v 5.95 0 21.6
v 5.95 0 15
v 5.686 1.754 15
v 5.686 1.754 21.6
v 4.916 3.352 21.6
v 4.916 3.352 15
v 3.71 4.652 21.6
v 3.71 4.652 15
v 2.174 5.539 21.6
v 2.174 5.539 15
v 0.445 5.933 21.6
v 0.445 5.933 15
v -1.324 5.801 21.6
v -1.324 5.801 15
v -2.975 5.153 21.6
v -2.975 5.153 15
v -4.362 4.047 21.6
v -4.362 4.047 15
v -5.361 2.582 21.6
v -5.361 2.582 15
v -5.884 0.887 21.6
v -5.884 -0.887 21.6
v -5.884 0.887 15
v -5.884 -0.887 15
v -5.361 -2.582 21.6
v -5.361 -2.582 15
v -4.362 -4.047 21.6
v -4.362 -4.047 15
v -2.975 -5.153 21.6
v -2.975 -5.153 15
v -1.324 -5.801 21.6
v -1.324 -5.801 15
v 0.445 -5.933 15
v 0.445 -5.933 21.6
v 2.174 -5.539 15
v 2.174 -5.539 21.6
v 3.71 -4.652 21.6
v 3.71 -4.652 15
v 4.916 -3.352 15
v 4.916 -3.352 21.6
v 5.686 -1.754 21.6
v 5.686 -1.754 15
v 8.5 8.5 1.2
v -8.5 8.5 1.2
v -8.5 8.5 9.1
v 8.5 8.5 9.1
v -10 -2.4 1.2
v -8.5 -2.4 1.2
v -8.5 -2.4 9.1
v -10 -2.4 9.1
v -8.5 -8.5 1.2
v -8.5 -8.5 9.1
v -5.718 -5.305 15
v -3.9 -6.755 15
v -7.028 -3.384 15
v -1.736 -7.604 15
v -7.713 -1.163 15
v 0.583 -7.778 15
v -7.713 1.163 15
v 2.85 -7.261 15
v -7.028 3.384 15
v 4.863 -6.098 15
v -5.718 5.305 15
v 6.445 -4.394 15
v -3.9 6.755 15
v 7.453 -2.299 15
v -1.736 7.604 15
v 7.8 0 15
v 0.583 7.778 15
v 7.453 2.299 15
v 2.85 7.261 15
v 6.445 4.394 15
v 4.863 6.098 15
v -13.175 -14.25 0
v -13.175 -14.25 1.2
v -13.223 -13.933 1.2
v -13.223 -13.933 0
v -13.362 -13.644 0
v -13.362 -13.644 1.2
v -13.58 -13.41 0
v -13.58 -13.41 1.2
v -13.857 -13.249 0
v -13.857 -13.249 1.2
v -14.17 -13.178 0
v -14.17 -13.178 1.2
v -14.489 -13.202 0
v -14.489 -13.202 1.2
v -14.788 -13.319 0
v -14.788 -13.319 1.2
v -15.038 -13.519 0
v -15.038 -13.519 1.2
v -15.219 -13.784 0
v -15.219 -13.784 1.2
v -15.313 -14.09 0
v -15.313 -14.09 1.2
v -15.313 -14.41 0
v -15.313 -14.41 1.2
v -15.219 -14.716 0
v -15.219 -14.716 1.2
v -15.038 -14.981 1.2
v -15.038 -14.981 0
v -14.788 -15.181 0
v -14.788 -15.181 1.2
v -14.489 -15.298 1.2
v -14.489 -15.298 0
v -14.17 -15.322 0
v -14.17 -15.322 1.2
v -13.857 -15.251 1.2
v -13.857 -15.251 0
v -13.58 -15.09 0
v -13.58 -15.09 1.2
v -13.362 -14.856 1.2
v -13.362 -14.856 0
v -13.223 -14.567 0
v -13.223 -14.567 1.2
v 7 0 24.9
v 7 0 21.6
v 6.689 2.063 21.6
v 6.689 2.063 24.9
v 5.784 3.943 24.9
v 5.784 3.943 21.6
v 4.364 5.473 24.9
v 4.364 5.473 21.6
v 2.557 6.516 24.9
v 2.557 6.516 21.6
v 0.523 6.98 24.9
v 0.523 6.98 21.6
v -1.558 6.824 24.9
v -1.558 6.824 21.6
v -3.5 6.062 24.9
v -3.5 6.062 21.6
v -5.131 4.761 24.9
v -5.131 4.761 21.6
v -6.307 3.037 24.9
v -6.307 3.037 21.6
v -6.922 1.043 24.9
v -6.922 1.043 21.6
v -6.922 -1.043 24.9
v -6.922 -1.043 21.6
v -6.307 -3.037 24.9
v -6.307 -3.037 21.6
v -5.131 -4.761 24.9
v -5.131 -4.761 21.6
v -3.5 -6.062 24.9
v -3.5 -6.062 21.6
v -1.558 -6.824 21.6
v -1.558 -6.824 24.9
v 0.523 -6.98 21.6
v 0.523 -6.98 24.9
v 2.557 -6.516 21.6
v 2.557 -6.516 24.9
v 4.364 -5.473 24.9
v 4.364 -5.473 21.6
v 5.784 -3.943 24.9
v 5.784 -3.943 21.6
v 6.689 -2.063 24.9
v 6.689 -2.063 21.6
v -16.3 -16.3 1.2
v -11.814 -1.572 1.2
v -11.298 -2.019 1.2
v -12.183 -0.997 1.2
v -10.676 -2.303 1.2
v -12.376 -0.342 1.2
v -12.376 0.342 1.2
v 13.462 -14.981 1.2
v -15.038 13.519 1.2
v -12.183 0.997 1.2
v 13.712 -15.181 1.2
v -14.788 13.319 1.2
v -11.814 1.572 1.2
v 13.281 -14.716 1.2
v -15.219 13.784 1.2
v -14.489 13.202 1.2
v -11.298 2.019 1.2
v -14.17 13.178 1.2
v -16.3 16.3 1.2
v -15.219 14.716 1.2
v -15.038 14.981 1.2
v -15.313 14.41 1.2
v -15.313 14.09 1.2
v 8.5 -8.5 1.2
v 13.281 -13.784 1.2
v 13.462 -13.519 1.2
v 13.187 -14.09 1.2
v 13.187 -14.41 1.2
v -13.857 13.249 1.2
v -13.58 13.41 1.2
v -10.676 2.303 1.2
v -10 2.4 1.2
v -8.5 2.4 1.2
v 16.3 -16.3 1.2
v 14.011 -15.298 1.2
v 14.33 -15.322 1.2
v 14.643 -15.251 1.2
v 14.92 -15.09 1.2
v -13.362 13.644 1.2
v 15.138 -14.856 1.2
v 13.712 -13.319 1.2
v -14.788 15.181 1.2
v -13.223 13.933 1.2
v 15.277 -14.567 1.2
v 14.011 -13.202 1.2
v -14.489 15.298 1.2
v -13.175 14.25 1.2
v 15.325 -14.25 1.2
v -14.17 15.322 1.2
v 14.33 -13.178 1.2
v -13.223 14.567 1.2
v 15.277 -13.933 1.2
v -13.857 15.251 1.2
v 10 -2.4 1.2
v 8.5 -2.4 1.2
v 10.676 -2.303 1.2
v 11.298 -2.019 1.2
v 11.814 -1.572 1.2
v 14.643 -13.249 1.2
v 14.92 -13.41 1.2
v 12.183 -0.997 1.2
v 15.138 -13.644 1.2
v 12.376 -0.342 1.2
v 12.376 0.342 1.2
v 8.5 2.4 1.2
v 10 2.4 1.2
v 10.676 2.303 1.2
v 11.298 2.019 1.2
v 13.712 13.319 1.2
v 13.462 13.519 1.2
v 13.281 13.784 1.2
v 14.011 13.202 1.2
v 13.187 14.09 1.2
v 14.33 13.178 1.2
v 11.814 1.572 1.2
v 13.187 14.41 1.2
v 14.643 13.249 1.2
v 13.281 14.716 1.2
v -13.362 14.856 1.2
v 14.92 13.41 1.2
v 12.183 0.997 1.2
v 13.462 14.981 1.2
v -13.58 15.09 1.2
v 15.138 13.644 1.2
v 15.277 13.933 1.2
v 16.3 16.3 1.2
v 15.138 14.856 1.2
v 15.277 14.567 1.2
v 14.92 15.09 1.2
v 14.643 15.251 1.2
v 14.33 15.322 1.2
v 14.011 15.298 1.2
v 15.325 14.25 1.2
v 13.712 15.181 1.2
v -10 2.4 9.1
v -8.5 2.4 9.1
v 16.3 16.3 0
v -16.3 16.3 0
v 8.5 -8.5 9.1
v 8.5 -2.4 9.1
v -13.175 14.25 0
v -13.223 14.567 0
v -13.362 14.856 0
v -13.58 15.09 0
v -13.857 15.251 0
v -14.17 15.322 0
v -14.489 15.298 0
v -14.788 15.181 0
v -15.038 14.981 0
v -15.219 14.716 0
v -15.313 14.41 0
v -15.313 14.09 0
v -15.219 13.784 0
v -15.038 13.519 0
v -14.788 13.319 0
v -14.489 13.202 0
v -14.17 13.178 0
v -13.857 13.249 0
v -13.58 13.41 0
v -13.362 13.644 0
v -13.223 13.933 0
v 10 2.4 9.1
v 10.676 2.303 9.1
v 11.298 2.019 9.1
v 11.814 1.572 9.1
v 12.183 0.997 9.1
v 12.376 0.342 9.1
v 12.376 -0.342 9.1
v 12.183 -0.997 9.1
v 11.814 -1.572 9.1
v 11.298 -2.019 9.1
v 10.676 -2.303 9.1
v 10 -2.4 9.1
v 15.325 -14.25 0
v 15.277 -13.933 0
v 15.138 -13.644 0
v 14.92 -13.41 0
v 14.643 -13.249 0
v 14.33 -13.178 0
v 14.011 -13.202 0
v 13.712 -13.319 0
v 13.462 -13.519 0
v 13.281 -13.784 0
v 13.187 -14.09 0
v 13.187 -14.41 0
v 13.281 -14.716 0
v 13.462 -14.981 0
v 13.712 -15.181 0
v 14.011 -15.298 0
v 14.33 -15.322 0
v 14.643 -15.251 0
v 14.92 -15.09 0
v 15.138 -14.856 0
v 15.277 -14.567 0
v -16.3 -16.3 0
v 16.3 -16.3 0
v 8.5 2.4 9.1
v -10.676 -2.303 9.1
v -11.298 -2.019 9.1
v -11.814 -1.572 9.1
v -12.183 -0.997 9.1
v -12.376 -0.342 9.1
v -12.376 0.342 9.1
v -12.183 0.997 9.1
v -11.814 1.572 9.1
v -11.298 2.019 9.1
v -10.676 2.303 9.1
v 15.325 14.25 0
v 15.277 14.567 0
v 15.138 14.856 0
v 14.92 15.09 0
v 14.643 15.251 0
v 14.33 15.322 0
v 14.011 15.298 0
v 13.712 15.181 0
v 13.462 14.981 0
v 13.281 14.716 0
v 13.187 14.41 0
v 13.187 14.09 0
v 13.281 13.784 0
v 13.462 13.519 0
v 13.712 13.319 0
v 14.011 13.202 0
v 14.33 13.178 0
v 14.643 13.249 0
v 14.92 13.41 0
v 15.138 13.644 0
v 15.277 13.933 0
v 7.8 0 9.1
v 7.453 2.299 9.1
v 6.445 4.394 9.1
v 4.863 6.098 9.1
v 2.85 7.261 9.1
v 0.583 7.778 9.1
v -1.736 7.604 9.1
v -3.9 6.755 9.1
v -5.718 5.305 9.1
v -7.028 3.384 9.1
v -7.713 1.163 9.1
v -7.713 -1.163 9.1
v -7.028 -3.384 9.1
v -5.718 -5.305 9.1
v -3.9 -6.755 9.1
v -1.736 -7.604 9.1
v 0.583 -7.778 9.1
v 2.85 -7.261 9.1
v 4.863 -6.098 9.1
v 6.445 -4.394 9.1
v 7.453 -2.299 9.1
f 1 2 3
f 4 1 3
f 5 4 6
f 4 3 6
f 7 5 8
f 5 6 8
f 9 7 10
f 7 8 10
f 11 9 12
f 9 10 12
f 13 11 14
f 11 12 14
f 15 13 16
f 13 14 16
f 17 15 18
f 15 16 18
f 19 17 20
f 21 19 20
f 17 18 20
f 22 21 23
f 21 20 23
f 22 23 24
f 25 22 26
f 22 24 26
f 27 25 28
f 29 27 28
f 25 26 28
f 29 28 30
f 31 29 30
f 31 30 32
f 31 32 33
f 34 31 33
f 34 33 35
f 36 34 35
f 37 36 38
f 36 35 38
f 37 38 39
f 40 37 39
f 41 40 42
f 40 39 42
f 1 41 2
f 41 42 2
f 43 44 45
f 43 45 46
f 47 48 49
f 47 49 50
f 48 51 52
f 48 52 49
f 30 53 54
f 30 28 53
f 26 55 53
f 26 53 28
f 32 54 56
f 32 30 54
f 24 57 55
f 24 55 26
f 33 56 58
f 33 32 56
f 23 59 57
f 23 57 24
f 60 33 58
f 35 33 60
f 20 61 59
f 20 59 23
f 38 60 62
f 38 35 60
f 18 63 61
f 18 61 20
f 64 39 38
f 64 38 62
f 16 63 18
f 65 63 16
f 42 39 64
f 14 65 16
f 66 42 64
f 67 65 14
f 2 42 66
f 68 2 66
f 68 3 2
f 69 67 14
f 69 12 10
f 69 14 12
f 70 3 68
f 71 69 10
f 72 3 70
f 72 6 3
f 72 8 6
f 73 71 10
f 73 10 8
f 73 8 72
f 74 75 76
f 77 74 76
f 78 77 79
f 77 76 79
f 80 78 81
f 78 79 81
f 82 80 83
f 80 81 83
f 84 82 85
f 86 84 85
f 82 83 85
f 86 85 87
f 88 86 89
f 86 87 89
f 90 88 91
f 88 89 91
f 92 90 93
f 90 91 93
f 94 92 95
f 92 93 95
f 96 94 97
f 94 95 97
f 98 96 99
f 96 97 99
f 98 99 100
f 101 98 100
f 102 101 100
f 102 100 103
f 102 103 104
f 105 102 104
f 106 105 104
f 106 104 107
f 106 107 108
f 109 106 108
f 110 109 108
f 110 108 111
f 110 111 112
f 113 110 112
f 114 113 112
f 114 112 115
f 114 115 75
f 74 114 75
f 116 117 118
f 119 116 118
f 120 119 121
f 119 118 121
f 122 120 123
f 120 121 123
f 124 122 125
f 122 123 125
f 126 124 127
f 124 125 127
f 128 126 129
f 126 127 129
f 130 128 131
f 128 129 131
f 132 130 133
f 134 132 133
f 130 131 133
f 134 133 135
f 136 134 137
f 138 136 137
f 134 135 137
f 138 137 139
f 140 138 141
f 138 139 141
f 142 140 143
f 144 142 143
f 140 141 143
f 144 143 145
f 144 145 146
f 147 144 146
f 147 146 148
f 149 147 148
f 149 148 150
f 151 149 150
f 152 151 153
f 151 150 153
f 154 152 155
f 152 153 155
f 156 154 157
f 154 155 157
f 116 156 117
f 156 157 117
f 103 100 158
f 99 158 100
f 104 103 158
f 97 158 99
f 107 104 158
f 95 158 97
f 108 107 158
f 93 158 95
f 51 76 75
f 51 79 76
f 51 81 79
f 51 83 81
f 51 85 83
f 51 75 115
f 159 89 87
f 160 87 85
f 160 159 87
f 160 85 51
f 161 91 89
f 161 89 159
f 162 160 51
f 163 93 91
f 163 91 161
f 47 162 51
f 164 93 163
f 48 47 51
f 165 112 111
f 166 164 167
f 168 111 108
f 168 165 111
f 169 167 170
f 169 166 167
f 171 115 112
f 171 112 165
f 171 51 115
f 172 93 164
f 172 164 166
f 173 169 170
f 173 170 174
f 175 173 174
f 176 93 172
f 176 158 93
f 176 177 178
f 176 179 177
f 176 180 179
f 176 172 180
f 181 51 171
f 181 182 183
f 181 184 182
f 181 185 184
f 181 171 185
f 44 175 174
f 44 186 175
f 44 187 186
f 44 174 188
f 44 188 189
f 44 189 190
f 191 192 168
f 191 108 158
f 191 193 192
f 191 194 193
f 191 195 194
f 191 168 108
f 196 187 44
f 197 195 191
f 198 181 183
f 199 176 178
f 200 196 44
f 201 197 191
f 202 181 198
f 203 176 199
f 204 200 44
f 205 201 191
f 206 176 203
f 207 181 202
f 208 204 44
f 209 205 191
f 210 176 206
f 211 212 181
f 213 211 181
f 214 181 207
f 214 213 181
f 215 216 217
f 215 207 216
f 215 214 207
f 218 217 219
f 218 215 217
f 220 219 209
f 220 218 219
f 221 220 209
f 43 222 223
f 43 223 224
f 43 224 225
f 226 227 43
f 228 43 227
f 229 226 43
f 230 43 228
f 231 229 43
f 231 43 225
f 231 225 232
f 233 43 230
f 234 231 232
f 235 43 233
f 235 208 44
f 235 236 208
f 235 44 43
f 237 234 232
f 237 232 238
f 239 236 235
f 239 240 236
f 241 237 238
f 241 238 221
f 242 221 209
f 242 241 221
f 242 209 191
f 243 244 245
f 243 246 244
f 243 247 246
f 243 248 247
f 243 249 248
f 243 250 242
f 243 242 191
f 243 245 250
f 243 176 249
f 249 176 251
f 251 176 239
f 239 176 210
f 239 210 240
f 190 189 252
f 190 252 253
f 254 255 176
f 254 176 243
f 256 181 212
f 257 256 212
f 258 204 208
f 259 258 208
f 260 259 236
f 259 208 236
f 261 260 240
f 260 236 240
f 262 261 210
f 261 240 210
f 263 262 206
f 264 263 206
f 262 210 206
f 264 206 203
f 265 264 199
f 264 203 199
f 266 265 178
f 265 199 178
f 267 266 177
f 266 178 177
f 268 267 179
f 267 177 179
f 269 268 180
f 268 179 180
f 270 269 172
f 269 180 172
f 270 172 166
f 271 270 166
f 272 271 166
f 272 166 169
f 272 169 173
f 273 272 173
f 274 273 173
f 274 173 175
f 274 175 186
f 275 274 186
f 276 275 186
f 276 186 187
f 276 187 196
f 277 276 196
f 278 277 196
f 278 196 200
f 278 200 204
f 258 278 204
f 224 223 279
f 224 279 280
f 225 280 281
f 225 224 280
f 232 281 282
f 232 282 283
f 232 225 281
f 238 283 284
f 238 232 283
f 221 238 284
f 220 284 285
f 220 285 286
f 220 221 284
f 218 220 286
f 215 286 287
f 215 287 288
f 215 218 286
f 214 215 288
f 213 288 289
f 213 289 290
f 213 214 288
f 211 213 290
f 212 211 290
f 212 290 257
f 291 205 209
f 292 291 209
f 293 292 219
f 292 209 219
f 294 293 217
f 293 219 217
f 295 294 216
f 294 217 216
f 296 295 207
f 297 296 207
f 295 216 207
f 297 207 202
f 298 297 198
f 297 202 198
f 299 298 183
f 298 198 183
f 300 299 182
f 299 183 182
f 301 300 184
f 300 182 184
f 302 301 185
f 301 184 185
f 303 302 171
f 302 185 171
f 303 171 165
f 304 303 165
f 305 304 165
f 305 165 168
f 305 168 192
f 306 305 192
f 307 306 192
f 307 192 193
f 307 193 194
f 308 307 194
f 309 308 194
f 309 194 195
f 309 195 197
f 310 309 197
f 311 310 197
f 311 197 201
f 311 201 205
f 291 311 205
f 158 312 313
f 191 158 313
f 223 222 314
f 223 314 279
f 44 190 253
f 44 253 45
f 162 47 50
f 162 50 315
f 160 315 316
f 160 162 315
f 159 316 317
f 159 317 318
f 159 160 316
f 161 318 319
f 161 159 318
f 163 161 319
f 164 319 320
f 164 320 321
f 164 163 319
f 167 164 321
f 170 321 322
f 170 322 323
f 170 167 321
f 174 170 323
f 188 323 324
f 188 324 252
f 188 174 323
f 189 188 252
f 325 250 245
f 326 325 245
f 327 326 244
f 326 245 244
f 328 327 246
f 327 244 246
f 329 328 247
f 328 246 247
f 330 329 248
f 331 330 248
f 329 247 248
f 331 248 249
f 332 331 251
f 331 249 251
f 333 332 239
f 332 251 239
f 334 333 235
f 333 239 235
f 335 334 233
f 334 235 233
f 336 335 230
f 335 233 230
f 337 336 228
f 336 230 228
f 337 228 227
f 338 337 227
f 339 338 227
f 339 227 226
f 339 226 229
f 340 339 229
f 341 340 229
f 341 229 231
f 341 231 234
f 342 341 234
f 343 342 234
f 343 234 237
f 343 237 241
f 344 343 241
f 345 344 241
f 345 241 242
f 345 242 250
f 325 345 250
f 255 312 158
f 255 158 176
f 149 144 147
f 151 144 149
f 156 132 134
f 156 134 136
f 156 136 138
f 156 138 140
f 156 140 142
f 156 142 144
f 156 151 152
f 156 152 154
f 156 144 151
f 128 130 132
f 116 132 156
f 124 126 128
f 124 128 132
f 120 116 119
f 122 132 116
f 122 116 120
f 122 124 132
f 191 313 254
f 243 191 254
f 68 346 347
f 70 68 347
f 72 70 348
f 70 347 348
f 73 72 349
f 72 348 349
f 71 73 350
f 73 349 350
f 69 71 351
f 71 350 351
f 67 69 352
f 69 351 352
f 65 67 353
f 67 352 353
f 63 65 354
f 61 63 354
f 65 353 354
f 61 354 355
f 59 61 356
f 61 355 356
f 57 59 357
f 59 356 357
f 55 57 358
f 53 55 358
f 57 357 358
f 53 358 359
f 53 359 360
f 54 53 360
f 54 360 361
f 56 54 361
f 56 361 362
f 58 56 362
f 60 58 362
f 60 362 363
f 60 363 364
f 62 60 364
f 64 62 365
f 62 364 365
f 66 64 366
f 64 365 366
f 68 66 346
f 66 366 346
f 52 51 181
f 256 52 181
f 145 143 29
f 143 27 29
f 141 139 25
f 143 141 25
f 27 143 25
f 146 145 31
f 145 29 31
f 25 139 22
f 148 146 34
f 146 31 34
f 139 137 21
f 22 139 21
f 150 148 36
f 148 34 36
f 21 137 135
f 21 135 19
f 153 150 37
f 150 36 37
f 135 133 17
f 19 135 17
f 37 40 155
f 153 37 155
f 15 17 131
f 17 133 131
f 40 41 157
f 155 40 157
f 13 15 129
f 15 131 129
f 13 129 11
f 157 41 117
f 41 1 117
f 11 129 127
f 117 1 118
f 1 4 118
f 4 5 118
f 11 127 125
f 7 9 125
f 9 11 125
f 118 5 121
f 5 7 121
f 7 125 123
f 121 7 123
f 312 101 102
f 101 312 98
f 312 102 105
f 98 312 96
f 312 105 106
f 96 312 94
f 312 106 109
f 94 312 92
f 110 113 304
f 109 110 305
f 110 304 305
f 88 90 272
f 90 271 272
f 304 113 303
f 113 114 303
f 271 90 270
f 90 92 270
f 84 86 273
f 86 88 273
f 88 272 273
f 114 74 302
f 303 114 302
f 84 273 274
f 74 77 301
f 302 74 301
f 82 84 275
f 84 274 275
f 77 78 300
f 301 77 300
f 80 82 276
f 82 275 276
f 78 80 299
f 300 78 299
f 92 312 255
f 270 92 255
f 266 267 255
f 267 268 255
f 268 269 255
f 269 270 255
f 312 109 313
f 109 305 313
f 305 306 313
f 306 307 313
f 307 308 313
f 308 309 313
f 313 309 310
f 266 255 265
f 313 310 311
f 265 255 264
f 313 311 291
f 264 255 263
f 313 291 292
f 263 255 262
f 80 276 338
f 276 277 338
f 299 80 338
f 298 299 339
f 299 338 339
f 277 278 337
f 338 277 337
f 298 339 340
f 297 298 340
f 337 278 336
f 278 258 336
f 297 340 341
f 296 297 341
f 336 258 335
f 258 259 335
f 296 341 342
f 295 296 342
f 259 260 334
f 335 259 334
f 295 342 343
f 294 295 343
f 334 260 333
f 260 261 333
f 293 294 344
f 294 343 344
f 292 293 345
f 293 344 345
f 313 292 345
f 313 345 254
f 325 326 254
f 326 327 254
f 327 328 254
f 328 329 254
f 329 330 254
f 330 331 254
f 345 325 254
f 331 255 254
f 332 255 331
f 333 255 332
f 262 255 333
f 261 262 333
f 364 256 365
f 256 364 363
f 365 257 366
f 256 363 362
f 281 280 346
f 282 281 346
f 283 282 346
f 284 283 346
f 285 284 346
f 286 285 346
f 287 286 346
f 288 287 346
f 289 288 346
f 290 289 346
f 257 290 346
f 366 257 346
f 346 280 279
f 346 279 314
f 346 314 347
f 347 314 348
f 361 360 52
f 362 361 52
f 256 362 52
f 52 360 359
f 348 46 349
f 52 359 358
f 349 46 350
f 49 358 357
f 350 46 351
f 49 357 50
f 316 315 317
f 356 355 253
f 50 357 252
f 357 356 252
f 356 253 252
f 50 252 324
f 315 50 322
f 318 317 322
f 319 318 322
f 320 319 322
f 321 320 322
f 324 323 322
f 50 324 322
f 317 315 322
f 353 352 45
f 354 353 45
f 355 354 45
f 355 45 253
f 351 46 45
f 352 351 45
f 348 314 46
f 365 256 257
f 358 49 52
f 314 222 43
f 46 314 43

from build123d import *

# Parameters (mm, degrees)
SKETCH1_W           = 32.6
SKETCH1_H           = 32.6
BOSS_EXTRUDE1_DEPTH = 1.2
SKETCH3_R           = 1.075
CUT_EXTRUDE1_DEPTH  = 24.082894099
SKETCH4_W           = 17
SKETCH4_H           = 17
BOSS_EXTRUDE2_DEPTH = 7.9
BOSS_EXTRUDE3_DEPTH = 7.9
SKETCH6_R           = 7.8
BOSS_EXTRUDE4_DEPTH = 5.9
SKETCH7_R           = 5.95
BOSS_EXTRUDE5_DEPTH = 6.6
SKETCH8_R           = 7
BOSS_EXTRUDE6_DEPTH = 3.3


with BuildPart() as part:
    # Sketch1 → Boss-Extrude1 (new body)
    with BuildSketch(Plane.XY):
        Rectangle(SKETCH1_W, SKETCH1_H)
    extrude(amount=BOSS_EXTRUDE1_DEPTH)

    # Sketch3 → Cut-Extrude1 (cut, through all)
    with BuildSketch(Plane.XY.offset(1.2)):
        with Locations((-14.25, 14.25)):
            Circle(SKETCH3_R)
        with Locations((14.25, 14.25)):
            Circle(SKETCH3_R)
        with Locations((14.25, -14.25)):
            Circle(SKETCH3_R)
        with Locations((-14.25, -14.25)):
            Circle(SKETCH3_R)
    extrude(amount=-CUT_EXTRUDE1_DEPTH, mode=Mode.SUBTRACT)

    # Sketch4 → Boss-Extrude2 (add)
    with BuildSketch(Plane.XY.offset(1.2)):
        Rectangle(SKETCH4_W, SKETCH4_H)
    extrude(amount=BOSS_EXTRUDE2_DEPTH)

    # Sketch5 → Boss-Extrude3 (add)
    with BuildSketch(Plane.XY.offset(1.2)):
        with BuildLine():
            Line((-10, 2.4), (10, 2.4))
            ThreePointArc((10, 2.4), (12.4, 0), (10, -2.4))
            Line((10, -2.4), (-10, -2.4))
            ThreePointArc((-10, -2.4), (-12.4, 0), (-10, 2.4))
        make_face()
    extrude(amount=BOSS_EXTRUDE3_DEPTH)

    # Sketch6 → Boss-Extrude4 (add)
    with BuildSketch(Plane.XY.offset(9.1)):
        Circle(SKETCH6_R)
    extrude(amount=BOSS_EXTRUDE4_DEPTH)

    # Sketch7 → Boss-Extrude5 (add)
    with BuildSketch(Plane.XY.offset(15)):
        Circle(SKETCH7_R)
    extrude(amount=BOSS_EXTRUDE5_DEPTH)

    # Sketch8 → Boss-Extrude6 (add)
    with BuildSketch(Plane.XY.offset(21.6)):
        Circle(SKETCH8_R)
    extrude(amount=BOSS_EXTRUDE6_DEPTH)


solid = part.part
